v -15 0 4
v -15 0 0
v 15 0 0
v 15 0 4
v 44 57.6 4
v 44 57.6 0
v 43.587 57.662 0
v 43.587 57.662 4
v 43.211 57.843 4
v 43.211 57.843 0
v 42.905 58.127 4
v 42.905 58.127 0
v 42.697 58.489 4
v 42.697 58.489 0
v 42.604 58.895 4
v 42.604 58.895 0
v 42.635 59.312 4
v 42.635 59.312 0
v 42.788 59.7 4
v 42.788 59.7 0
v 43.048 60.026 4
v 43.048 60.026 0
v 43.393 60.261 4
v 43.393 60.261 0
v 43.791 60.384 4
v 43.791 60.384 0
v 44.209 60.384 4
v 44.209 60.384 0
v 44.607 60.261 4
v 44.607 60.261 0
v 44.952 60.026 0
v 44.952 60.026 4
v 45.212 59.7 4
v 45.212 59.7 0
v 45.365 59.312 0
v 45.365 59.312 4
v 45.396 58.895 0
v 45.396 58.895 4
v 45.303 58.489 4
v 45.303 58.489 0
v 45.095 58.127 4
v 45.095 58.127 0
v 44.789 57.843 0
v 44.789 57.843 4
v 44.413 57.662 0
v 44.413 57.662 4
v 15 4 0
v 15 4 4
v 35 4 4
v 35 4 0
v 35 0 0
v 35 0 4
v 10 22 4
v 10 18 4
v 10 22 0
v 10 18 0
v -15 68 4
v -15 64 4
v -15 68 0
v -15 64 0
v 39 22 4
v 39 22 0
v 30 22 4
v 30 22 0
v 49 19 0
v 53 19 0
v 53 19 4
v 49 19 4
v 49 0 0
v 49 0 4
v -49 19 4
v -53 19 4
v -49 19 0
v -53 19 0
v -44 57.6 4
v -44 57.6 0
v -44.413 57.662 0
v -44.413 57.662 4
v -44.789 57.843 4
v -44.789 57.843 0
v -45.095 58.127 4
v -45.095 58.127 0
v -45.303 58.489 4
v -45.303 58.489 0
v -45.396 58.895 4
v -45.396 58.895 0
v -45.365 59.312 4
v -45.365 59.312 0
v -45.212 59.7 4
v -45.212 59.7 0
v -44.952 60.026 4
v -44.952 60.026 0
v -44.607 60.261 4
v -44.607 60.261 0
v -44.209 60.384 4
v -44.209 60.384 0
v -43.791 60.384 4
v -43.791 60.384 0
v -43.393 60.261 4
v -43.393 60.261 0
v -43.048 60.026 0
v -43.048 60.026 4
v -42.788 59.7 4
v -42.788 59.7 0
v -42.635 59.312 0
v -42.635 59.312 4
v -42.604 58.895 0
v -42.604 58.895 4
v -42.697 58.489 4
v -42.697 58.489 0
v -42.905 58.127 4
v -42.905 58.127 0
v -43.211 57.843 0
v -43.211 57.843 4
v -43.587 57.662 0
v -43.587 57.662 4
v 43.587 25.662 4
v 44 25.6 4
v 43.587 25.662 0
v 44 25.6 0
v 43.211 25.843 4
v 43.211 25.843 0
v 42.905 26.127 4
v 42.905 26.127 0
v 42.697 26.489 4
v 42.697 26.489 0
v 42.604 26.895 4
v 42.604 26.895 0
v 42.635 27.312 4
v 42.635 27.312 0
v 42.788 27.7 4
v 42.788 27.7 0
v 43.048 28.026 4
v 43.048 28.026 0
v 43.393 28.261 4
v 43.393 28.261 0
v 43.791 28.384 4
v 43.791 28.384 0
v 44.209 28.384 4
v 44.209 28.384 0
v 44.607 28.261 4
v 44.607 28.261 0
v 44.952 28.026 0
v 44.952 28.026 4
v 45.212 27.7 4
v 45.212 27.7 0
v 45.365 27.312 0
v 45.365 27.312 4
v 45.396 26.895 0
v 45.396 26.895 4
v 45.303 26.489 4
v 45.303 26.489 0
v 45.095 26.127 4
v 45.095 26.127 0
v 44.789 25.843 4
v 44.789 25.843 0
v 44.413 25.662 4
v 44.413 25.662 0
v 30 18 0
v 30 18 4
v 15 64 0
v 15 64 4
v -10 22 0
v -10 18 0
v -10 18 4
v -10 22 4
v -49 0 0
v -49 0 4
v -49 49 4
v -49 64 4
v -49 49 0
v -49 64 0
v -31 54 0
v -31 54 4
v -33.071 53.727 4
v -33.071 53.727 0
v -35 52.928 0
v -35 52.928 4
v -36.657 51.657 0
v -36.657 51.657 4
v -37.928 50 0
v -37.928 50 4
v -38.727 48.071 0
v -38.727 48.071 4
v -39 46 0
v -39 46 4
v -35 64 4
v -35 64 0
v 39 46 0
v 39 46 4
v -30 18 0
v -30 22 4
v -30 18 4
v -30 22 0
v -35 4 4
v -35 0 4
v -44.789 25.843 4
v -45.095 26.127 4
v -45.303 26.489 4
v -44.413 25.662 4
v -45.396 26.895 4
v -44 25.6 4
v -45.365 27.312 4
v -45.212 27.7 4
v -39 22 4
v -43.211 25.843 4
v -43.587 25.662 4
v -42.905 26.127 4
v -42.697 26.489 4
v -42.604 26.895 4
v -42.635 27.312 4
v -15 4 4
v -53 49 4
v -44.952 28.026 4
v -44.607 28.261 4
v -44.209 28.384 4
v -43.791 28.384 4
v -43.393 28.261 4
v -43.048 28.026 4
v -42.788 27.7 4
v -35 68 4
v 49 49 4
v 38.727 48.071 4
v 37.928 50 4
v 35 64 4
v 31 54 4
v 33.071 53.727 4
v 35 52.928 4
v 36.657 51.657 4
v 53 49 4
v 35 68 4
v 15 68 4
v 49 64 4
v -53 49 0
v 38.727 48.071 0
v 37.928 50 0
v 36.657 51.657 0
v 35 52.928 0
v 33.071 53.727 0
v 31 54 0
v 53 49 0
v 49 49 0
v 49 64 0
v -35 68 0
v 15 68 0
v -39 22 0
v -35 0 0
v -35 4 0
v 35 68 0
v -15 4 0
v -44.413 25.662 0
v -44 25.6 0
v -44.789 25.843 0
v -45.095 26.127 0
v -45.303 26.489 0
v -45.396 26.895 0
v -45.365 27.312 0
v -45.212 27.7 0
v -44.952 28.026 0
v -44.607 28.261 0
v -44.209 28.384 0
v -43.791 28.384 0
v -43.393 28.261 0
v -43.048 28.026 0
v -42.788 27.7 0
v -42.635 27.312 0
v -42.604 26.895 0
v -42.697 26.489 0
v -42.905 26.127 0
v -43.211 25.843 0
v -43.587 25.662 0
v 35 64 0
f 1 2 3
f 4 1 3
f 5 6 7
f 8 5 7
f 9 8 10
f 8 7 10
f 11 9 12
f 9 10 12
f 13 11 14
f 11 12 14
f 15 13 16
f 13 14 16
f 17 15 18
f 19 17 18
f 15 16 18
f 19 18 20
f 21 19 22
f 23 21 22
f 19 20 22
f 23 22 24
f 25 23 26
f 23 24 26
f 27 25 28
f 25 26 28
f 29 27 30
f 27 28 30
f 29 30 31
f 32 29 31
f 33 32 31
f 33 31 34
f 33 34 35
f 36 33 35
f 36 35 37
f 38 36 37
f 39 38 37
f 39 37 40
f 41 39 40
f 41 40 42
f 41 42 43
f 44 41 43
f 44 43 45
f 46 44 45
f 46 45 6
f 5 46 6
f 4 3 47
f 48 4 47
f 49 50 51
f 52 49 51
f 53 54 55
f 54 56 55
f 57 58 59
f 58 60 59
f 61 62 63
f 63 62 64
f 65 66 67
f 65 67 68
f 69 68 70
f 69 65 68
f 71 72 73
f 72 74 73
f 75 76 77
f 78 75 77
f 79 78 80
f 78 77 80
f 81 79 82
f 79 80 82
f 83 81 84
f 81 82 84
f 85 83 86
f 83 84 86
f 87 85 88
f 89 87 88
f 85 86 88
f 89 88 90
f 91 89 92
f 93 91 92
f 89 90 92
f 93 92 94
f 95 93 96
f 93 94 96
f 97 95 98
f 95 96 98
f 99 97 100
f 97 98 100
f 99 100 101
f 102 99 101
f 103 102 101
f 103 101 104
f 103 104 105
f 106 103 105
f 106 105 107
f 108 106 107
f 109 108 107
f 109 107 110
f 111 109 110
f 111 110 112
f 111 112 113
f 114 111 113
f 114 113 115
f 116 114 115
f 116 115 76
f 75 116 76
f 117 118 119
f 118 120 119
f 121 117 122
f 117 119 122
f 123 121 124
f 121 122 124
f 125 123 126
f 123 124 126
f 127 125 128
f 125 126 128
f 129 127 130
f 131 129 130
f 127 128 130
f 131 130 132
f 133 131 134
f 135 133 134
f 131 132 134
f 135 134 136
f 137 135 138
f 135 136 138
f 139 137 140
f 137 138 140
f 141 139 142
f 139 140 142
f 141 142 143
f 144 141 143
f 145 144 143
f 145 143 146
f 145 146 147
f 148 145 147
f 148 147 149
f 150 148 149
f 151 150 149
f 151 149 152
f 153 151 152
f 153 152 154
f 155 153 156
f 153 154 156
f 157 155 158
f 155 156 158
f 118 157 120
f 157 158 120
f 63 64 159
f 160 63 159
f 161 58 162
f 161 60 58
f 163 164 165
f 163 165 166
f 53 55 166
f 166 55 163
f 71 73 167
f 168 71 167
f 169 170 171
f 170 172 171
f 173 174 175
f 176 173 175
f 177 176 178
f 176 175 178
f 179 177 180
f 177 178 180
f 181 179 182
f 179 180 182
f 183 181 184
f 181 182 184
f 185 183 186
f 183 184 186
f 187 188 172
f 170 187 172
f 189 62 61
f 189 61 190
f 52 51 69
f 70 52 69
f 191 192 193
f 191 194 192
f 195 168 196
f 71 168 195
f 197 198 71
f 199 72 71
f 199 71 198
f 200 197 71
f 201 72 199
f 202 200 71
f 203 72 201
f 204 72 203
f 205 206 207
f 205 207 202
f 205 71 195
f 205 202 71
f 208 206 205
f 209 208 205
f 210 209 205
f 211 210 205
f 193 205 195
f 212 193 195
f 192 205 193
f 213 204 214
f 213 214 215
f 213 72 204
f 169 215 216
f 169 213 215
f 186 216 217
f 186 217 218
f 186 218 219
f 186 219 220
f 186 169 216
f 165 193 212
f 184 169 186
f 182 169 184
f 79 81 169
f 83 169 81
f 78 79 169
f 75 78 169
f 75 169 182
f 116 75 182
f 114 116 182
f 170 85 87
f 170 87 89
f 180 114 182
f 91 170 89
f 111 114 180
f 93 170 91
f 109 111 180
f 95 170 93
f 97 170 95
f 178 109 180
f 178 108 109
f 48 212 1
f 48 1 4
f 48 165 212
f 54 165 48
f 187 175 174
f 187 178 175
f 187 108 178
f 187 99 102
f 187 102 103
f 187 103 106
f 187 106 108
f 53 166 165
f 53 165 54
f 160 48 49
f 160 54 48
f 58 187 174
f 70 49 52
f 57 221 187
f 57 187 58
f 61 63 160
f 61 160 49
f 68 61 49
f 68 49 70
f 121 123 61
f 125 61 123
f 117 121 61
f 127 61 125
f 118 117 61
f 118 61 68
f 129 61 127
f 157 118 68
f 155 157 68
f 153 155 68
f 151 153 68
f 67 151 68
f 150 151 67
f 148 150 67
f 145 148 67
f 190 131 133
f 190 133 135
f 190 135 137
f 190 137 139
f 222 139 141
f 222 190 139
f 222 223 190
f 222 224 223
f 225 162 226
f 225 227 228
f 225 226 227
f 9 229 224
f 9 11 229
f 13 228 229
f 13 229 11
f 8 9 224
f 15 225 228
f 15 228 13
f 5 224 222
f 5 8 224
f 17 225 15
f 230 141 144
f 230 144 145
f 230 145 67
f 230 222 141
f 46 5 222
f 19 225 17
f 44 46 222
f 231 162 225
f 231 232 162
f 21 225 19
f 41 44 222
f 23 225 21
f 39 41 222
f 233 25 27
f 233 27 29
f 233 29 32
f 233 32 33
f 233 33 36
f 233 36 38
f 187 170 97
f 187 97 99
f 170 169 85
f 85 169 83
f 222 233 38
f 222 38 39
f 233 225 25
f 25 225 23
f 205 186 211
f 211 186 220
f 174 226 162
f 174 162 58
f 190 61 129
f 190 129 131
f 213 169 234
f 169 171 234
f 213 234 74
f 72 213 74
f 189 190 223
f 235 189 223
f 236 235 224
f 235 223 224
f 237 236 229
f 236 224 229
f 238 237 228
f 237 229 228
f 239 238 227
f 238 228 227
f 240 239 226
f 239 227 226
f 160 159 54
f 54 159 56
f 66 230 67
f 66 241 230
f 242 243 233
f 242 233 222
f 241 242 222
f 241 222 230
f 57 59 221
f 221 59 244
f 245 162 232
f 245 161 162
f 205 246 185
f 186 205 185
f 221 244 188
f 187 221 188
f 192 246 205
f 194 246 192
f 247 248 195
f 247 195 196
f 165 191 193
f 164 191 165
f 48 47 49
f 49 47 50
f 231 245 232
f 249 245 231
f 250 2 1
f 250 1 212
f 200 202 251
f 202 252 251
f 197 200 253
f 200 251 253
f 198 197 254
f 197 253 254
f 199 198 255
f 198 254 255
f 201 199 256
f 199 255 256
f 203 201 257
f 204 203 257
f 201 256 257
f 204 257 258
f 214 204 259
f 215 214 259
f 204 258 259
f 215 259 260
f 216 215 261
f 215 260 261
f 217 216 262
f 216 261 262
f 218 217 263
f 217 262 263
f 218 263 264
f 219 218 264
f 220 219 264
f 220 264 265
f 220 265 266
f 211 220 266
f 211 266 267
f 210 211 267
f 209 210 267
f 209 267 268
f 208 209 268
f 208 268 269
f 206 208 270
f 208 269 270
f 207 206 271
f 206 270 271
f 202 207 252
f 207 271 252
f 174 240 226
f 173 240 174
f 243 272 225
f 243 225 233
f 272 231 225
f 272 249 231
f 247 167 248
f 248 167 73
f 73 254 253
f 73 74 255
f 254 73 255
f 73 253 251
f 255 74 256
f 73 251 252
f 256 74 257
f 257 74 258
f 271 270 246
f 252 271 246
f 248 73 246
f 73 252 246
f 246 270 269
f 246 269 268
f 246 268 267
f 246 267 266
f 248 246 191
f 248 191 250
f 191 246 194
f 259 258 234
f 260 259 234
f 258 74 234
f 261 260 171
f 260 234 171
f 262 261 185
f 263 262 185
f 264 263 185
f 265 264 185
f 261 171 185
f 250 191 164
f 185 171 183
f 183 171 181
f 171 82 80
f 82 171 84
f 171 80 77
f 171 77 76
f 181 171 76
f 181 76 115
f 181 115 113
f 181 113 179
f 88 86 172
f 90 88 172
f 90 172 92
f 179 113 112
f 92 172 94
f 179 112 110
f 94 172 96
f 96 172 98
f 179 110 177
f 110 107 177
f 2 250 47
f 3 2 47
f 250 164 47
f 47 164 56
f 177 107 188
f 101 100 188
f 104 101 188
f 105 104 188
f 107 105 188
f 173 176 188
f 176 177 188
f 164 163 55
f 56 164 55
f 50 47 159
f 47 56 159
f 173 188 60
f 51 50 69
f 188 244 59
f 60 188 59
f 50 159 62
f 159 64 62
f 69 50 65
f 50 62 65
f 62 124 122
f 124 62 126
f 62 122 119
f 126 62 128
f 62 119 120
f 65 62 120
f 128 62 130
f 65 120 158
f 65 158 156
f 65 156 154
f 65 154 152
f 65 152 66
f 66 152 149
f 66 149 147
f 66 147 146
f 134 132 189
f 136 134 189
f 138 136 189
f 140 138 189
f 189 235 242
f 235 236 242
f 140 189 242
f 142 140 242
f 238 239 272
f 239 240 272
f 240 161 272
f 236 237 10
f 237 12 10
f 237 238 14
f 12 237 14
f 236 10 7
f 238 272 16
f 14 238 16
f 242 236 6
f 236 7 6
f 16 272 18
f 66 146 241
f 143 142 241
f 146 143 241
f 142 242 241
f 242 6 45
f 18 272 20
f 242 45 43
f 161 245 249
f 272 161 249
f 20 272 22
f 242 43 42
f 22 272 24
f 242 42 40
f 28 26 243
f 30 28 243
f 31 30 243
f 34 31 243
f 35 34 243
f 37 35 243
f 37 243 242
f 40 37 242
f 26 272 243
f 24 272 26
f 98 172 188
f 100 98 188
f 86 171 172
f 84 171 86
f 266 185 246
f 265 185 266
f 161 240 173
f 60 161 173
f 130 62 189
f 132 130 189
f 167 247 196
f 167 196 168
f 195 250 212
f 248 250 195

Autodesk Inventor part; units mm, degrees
ref_plane "YZ Plane" through (0, 0, 0) normal (1, 0, 0) x (0, 1, 0)
ref_plane "XZ Plane" through (0, 0, 0) normal (0, 1, 0) x (-1, 0, 0)
ref_plane "XY Plane" through (0, 0, 0) normal (0, 0, 1) x (1, 0, 0)
sketch "Эскиз1" plane through (0, 0, 0) normal (0, 0, 1) x (1, 0, 0)
  line L0 (0, 0) -> (0, 64) construction
  line L1 (0, 64) -> (-15, 64)
  line L2 (-15, 64) -> (-15, 68)
  line L3 (-15, 68) -> (-35, 68)
  line L4 (-35, 68) -> (-35, 64)
  line L5 (-35, 64) -> (-49, 64)
  line L6 (-49, 64) -> (-49, 49)
  line L7 (-49, 49) -> (-53, 49)
  line L8 (-53, 49) -> (-53, 19)
  line L9 (-53, 19) -> (-49, 19)
  line L10 (-49, 19) -> (-49, 0)
  line L11 (-39, 22) -> (-39, 54)
  line L12 (0, 0) -> (-15, 0)
  line L13 (-15, 0) -> (-15, 4)
  line L14 (-15, 4) -> (-35, 4)
  line L15 (-35, 4) -> (-35, 0)
  line L16 (-35, 0) -> (-49, 0)
  line L17 (-39, 22) -> (-30, 22)
  line L18 (-30, 22) -> (-30, 18)
  line L19 (-30, 18) -> (-10, 18)
  line L20 (-10, 18) -> (-10, 22)
  line L21 (-10, 22) -> (0, 22)
  line L22 (-39, 54) -> (0, 54)
  line L23 (0, 64) -> (15, 64)
  line L24 (15, 64) -> (15, 68)
  line L25 (15, 68) -> (35, 68)
  line L26 (35, 68) -> (35, 64)
  line L27 (35, 64) -> (49, 64)
  line L28 (49, 64) -> (49, 49)
  line L29 (49, 49) -> (53, 49)
  line L30 (53, 49) -> (53, 19)
  line L31 (53, 19) -> (49, 19)
  line L32 (49, 19) -> (49, 0)
  line L33 (39, 22) -> (39, 54)
  line L34 (0, 0) -> (15, 0)
  line L35 (15, 0) -> (15, 4)
  line L36 (15, 4) -> (35, 4)
  line L37 (35, 4) -> (35, 0)
  line L38 (35, 0) -> (49, 0)
  line L39 (39, 22) -> (30, 22)
  line L40 (30, 22) -> (30, 18)
  line L41 (30, 18) -> (10, 18)
  line L42 (10, 18) -> (10, 22)
  line L43 (10, 22) -> (0, 22)
  line L44 (39, 54) -> (0, 54)
  point P0 (0, 32)
  point P1 (53, 32)
  dimension "d0" = 30
  dimension "d8" = 10
  dimension "d12" = 4
  dimension "d13" = 18
  dimension "d14" = 20
  dimension "d15" = 20
  dimension "d16" = 68
  dimension "d17" = 30
  dimension "d18" = 20
  dimension "d19" = 10
  dimension "d20" = 78
  dimension "d21" = 30
  dimension "d22" = 20
  dimension "d23" = 19
extrude "Выдавливание1" add sketch "Эскиз1" along normal blind 4
fillet "Сопряжение1" radius 8 2 edges at (-39, 54, 2) (39, 54, 2)
sketch "Эскиз2" plane through (0, 0, 4) normal (0, 0, 1) x (1, 0, 0)
  line L0 (0, 0) -> (0, 64)
  line L1 (15, 64) -> (-15, 64) projected
  line L2 (-49, 64) -> (-49, 49) projected
  line L3 (-35, 64) -> (-49, 64) projected
  point P0 (-44, 59)
  point P1 (-44, 27)
  point P2 (44, 59)
  point P3 (44, 27)
  dimension "d31" = 5
  dimension "d32" = 5
  dimension "d33" = 37
hole "Отверстие1" at (-44, 59, 4) at (-44, 27, 4) at (44, 59, 4) at (44, 27, 4) direction (0, 0, -1) diameter 2.8 depth 8
properties part number "stiffenerFront" material "Дерево (береза)"
